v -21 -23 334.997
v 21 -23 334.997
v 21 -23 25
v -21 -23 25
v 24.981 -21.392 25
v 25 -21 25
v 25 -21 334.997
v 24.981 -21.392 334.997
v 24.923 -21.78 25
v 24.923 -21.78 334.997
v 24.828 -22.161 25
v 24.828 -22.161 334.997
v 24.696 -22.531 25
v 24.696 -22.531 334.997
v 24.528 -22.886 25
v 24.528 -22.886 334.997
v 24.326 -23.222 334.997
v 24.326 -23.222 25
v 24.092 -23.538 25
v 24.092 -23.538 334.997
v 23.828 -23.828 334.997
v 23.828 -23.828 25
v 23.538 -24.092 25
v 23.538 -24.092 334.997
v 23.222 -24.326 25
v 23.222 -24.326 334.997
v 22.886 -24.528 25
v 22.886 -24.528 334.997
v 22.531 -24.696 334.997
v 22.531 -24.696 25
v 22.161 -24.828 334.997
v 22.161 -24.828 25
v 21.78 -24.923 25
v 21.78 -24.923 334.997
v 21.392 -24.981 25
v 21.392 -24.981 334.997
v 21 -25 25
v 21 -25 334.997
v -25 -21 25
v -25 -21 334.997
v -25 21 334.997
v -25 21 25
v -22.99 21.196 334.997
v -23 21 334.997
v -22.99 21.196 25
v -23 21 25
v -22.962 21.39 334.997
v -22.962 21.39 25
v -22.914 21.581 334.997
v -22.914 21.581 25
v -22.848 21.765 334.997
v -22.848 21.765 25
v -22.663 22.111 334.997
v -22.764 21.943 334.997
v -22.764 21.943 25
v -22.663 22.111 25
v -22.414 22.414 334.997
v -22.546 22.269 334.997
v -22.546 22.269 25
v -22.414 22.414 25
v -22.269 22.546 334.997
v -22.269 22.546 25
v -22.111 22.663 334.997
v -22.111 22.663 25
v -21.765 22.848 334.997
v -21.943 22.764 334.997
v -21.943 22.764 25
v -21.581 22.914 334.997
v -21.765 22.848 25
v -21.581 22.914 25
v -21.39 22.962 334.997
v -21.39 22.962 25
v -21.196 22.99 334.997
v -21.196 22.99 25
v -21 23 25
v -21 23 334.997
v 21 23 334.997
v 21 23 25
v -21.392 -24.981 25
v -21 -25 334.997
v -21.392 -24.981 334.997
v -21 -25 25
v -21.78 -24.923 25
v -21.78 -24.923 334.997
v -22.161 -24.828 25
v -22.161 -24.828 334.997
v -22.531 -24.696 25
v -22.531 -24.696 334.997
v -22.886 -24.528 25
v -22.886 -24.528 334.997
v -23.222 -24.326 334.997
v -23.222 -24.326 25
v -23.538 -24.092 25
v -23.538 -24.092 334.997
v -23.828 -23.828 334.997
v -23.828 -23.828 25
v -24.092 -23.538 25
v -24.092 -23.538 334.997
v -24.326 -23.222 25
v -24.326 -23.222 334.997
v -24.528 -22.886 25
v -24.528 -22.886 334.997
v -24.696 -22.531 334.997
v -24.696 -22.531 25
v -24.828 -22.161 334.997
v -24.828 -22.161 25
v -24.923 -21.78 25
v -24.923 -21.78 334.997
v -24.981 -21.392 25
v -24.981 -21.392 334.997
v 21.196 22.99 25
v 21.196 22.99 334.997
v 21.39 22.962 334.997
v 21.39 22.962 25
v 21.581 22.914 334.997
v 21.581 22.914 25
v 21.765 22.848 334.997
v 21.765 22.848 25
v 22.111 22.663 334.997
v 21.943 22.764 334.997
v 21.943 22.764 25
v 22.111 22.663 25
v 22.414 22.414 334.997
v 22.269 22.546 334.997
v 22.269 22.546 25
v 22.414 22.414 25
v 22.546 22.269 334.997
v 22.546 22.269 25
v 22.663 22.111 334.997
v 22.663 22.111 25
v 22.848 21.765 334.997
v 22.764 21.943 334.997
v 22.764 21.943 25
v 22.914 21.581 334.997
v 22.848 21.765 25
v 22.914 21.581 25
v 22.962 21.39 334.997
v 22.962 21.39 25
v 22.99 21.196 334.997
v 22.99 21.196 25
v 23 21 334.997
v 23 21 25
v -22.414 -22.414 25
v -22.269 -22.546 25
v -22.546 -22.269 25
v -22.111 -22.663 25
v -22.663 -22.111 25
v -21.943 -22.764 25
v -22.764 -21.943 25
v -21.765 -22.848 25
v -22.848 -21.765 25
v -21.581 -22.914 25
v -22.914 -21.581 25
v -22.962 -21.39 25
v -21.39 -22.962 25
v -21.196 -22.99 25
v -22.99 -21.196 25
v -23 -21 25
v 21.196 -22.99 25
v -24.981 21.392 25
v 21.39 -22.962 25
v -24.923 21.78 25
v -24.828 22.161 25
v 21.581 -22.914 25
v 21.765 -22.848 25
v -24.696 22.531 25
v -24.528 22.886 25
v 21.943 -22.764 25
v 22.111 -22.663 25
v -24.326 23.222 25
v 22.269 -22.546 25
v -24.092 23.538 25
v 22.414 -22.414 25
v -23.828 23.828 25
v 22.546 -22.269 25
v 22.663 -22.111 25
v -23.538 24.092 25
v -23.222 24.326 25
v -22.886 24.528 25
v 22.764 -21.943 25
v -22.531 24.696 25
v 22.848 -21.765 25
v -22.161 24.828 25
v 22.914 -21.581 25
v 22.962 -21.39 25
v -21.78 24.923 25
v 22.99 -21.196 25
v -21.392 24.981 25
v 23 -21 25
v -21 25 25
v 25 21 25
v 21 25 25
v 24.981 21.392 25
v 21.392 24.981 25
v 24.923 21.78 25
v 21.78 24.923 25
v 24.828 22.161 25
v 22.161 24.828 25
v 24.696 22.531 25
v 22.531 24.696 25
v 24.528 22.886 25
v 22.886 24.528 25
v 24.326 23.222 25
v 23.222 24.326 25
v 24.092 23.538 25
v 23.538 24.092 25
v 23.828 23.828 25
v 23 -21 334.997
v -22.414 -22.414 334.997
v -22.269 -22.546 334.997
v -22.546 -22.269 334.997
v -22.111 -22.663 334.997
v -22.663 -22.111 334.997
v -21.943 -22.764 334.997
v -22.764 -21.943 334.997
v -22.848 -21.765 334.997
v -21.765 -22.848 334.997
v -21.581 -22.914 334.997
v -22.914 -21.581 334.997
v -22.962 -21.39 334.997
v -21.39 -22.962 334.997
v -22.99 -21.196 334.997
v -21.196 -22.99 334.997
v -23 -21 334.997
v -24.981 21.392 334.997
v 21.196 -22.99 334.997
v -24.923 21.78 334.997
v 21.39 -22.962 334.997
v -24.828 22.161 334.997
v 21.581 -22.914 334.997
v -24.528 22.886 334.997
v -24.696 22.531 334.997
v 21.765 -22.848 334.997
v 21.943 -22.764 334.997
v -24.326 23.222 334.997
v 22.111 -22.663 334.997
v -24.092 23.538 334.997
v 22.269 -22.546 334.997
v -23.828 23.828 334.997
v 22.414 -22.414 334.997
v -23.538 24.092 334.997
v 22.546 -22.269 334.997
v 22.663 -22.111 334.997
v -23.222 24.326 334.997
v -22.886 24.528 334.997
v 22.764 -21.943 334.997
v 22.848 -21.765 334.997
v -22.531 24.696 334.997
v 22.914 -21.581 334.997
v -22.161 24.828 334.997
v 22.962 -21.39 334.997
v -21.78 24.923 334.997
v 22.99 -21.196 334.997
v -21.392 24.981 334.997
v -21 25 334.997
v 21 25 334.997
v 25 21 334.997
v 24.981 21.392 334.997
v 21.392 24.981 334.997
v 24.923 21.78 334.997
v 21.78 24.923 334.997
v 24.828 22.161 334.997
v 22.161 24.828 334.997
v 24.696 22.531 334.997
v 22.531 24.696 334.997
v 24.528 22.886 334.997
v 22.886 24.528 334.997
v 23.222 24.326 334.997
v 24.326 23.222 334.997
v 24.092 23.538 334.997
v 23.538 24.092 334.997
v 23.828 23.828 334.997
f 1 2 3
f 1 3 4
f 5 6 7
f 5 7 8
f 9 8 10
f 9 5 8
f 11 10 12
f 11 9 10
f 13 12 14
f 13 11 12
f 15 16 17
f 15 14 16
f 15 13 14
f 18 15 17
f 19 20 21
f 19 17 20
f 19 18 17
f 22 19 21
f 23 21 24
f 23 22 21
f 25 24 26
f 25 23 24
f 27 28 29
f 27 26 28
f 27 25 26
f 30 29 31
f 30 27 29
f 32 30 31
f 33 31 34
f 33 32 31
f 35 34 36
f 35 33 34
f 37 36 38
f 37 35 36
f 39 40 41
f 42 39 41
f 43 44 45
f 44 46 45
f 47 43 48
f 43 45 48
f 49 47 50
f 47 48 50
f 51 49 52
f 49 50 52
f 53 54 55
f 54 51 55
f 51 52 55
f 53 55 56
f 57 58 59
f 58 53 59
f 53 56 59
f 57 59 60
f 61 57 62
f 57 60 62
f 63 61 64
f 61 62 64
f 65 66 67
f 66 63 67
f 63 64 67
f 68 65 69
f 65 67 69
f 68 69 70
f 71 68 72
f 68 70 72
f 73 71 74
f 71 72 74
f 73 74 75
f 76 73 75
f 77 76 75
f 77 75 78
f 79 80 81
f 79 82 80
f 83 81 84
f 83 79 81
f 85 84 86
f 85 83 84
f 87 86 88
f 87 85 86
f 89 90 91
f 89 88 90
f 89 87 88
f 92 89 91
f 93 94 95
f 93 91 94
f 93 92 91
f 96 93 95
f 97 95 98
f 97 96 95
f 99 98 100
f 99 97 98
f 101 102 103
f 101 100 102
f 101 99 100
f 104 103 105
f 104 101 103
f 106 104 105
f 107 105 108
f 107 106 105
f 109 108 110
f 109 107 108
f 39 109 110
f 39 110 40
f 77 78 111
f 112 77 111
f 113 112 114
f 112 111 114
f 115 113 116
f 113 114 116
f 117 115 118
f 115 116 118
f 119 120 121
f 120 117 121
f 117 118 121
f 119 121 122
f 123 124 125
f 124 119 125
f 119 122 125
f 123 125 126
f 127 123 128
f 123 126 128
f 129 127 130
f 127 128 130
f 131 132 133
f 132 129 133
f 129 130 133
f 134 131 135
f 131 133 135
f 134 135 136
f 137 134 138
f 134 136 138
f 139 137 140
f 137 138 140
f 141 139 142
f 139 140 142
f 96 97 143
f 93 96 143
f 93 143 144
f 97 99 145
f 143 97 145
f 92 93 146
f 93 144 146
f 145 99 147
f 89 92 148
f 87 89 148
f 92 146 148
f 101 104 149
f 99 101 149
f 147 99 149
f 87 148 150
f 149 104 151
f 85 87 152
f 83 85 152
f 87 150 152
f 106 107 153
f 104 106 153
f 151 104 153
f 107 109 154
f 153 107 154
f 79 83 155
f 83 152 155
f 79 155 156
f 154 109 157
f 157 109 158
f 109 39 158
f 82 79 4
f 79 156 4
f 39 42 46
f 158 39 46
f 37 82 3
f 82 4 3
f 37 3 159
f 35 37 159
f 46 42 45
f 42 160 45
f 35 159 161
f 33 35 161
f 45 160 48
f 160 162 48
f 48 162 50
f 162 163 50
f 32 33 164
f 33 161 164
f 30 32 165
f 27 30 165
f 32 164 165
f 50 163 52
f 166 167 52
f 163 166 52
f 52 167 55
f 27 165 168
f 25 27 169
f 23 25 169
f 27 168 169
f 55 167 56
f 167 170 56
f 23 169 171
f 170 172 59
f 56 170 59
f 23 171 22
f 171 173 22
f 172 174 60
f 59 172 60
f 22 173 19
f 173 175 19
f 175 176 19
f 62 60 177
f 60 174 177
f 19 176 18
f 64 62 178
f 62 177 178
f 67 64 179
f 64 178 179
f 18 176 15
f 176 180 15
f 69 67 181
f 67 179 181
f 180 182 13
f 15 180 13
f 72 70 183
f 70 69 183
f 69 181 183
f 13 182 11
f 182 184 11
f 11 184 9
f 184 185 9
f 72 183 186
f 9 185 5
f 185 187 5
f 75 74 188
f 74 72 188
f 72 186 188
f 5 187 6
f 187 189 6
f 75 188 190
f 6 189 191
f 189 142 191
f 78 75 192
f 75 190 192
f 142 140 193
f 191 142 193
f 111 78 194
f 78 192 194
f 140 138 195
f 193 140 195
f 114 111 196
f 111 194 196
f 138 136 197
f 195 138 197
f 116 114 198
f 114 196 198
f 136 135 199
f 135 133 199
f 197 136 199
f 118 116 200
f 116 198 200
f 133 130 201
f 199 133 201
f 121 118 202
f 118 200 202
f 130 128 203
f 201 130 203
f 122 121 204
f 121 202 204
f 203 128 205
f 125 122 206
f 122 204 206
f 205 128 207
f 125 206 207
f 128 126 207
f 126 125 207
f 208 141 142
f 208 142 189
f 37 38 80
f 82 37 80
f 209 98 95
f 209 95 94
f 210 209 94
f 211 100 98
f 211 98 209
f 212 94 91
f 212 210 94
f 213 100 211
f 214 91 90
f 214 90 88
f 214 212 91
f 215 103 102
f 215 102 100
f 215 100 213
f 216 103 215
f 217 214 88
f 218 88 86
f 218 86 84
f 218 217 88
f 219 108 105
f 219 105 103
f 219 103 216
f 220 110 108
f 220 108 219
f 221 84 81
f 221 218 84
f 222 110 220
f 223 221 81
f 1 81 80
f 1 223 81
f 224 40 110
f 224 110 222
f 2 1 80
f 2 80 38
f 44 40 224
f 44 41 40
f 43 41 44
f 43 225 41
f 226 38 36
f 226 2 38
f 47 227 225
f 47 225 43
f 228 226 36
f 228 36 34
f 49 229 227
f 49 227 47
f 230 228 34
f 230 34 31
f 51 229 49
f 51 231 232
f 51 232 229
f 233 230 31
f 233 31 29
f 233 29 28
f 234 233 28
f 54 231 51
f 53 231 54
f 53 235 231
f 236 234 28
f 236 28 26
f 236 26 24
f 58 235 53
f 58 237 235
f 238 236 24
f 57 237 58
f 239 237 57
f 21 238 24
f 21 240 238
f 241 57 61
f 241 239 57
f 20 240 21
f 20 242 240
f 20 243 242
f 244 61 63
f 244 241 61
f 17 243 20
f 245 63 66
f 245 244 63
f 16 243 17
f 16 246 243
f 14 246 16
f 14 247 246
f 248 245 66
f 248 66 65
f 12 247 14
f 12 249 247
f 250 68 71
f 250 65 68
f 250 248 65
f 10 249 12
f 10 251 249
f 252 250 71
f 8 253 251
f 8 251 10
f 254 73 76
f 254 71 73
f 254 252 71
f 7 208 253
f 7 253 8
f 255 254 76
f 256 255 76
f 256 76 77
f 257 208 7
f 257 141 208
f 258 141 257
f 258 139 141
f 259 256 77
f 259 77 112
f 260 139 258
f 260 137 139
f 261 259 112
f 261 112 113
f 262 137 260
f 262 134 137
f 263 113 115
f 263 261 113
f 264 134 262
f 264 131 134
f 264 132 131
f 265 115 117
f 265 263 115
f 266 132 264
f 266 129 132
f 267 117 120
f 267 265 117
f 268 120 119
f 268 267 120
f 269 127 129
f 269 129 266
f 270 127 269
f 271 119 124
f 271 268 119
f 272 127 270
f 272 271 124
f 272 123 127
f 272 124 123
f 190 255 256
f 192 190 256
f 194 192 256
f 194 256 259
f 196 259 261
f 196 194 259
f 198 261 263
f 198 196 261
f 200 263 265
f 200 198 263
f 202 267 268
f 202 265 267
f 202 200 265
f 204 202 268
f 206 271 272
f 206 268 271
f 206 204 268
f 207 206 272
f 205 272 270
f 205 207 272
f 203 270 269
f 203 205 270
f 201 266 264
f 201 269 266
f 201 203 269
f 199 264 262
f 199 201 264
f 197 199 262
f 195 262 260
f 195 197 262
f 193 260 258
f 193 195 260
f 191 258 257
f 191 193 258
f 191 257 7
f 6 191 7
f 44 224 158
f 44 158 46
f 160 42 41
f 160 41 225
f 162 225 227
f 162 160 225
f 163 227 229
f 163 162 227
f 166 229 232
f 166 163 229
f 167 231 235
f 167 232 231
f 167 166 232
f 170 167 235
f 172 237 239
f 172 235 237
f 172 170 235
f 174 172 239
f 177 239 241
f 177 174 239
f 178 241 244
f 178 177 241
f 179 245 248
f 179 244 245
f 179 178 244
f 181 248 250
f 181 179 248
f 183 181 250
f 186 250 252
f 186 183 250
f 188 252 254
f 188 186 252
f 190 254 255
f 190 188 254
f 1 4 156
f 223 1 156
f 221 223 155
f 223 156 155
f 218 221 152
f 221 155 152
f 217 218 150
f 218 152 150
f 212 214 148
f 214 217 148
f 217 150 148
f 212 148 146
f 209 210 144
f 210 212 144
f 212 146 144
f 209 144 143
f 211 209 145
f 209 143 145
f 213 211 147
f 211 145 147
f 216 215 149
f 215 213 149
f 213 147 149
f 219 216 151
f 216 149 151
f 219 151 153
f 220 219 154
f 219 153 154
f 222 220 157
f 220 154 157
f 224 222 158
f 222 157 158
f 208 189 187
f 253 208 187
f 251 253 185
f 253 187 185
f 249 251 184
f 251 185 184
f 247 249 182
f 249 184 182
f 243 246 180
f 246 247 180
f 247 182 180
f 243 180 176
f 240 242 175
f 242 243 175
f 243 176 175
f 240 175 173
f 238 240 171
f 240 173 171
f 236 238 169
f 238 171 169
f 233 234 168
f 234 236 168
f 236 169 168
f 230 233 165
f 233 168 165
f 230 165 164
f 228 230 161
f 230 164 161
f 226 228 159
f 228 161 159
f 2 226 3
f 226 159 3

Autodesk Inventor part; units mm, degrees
ref_plane "Start Plane" through (0, 0, 25) normal (0, 0, 1) x (1, 0, 0)
ref_plane "End Plane" through (0, 0, 334.9974) normal (0, 0, 1) x (1, 0, 0)
sketch "Sketch" plane through (0, 0, 0) normal (0, 0, 1) x (1, 0, 0)
  line L0 (-25, -21) -> (-25, 21)
  line L1 (-21, 25) -> (21, 25)
  line L2 (25, 21) -> (25, -21)
  line L3 (21, -25) -> (-21, -25)
  arc A0 (-25, -21) -> (-21, -25) centre (-21, -21) ccw
  arc A1 (25, 21) -> (21, 25) centre (21, 21) ccw
  arc A2 (-21, 25) -> (-25, 21) centre (-21, 21) ccw
  arc A3 (21, -25) -> (25, -21) centre (21, -21) ccw
  arc A4 (-21, 23) -> (-23, 21) centre (-21, 21) ccw
  line L4 (-21, 23) -> (21, 23)
  arc A5 (23, 21) -> (21, 23) centre (21, 21) ccw
  line L5 (23, 21) -> (23, -21)
  arc A6 (21, -23) -> (23, -21) centre (21, -21) ccw
  line L6 (21, -23) -> (-21, -23)
  arc A7 (-23, -21) -> (-21, -23) centre (-21, -21) ccw
  line L7 (-23, -21) -> (-23, 21)
  line L8 (0, 36.1598) -> (0, -36.1598) construction
  line L9 (-36.1598, 0) -> (36.1598, 0) construction
  dimension "d7" = 4
  dimension "d9" = 50
  dimension "d11" = 50
  dimension "d12" = 2
  dimension "d15" = 25
  dimension "d16" = 25
extrude "Body" add sketch "Sketch" along normal up to surface (309.9974 mm away) from surface at 25
sketch "Sketch3" plane through (0, 0, 0) normal (0, 0, 1) x (1, 0, 0)
  line L0 (0, 0) -> (10, 0)
ref_plane "Work Plane3" through (0, 0, 0) normal (0, -1, 0) x (1, 0, 0)
sketch "Sketch4" plane through (0, 0, 0) normal (0, -1, 0) x (1, 0, 0)
  line L0 (-2, 25) -> (12, 25)
  line L1 (-2, 334.9974) -> (12, 334.9974)
  dimension "d18" = 309.9974
ref_plane "Work Plane4" through (1275, 21, 25) normal (0, 0, -1) x (-1, 0, 0)
split "Split1" plane through (1275, 21, 25) removes the side toward (0, 0, -1)
ref_plane "Work Plane5" through (-1042.5, 21, 334.9974) normal (0, 0, 1) x (1, 0, 0)
split "Split2" plane through (-1042.5, 21, 334.9974) removes the side toward (0, 0, 1)
ref_plane "Work Plane6" through (1270, -21, 785) normal (0, 0, 1) x (1, 0, 0)
split "Split3" plane through (1270, -21, 785) removes the side toward (0, 0, 1)
equation "\"d7\" = G_IR"
equation "\"d9\" = G_W"
equation "\"d11\" = G_H"
equation "\"d12\" = G_T"
equation "\"d15\" = 0.5 * d9"
equation "\"d16\" = 0.5 * d11"
equation "\"d3\" = G_L"
equation "\"G_W\" = 50"
equation "\"G_H\" = 50"
equation "\"G_T\" = 2"
equation "\"G_IR\" = 4"
equation "\"G_L\" = d18"
equation "\"G_OFFSET_START\" = -25"
equation "\"G_OFFSET_END\" = 124.9974"
equation "\"d13\" = -G_OFFSET_START"
equation "\"d14\" = G_OFFSET_END + B_L"
equation "\"B_L\" = 210"
properties part number "ISO 10799-2 - 50x50x2 - 310" material "Steel, Galvanized"
